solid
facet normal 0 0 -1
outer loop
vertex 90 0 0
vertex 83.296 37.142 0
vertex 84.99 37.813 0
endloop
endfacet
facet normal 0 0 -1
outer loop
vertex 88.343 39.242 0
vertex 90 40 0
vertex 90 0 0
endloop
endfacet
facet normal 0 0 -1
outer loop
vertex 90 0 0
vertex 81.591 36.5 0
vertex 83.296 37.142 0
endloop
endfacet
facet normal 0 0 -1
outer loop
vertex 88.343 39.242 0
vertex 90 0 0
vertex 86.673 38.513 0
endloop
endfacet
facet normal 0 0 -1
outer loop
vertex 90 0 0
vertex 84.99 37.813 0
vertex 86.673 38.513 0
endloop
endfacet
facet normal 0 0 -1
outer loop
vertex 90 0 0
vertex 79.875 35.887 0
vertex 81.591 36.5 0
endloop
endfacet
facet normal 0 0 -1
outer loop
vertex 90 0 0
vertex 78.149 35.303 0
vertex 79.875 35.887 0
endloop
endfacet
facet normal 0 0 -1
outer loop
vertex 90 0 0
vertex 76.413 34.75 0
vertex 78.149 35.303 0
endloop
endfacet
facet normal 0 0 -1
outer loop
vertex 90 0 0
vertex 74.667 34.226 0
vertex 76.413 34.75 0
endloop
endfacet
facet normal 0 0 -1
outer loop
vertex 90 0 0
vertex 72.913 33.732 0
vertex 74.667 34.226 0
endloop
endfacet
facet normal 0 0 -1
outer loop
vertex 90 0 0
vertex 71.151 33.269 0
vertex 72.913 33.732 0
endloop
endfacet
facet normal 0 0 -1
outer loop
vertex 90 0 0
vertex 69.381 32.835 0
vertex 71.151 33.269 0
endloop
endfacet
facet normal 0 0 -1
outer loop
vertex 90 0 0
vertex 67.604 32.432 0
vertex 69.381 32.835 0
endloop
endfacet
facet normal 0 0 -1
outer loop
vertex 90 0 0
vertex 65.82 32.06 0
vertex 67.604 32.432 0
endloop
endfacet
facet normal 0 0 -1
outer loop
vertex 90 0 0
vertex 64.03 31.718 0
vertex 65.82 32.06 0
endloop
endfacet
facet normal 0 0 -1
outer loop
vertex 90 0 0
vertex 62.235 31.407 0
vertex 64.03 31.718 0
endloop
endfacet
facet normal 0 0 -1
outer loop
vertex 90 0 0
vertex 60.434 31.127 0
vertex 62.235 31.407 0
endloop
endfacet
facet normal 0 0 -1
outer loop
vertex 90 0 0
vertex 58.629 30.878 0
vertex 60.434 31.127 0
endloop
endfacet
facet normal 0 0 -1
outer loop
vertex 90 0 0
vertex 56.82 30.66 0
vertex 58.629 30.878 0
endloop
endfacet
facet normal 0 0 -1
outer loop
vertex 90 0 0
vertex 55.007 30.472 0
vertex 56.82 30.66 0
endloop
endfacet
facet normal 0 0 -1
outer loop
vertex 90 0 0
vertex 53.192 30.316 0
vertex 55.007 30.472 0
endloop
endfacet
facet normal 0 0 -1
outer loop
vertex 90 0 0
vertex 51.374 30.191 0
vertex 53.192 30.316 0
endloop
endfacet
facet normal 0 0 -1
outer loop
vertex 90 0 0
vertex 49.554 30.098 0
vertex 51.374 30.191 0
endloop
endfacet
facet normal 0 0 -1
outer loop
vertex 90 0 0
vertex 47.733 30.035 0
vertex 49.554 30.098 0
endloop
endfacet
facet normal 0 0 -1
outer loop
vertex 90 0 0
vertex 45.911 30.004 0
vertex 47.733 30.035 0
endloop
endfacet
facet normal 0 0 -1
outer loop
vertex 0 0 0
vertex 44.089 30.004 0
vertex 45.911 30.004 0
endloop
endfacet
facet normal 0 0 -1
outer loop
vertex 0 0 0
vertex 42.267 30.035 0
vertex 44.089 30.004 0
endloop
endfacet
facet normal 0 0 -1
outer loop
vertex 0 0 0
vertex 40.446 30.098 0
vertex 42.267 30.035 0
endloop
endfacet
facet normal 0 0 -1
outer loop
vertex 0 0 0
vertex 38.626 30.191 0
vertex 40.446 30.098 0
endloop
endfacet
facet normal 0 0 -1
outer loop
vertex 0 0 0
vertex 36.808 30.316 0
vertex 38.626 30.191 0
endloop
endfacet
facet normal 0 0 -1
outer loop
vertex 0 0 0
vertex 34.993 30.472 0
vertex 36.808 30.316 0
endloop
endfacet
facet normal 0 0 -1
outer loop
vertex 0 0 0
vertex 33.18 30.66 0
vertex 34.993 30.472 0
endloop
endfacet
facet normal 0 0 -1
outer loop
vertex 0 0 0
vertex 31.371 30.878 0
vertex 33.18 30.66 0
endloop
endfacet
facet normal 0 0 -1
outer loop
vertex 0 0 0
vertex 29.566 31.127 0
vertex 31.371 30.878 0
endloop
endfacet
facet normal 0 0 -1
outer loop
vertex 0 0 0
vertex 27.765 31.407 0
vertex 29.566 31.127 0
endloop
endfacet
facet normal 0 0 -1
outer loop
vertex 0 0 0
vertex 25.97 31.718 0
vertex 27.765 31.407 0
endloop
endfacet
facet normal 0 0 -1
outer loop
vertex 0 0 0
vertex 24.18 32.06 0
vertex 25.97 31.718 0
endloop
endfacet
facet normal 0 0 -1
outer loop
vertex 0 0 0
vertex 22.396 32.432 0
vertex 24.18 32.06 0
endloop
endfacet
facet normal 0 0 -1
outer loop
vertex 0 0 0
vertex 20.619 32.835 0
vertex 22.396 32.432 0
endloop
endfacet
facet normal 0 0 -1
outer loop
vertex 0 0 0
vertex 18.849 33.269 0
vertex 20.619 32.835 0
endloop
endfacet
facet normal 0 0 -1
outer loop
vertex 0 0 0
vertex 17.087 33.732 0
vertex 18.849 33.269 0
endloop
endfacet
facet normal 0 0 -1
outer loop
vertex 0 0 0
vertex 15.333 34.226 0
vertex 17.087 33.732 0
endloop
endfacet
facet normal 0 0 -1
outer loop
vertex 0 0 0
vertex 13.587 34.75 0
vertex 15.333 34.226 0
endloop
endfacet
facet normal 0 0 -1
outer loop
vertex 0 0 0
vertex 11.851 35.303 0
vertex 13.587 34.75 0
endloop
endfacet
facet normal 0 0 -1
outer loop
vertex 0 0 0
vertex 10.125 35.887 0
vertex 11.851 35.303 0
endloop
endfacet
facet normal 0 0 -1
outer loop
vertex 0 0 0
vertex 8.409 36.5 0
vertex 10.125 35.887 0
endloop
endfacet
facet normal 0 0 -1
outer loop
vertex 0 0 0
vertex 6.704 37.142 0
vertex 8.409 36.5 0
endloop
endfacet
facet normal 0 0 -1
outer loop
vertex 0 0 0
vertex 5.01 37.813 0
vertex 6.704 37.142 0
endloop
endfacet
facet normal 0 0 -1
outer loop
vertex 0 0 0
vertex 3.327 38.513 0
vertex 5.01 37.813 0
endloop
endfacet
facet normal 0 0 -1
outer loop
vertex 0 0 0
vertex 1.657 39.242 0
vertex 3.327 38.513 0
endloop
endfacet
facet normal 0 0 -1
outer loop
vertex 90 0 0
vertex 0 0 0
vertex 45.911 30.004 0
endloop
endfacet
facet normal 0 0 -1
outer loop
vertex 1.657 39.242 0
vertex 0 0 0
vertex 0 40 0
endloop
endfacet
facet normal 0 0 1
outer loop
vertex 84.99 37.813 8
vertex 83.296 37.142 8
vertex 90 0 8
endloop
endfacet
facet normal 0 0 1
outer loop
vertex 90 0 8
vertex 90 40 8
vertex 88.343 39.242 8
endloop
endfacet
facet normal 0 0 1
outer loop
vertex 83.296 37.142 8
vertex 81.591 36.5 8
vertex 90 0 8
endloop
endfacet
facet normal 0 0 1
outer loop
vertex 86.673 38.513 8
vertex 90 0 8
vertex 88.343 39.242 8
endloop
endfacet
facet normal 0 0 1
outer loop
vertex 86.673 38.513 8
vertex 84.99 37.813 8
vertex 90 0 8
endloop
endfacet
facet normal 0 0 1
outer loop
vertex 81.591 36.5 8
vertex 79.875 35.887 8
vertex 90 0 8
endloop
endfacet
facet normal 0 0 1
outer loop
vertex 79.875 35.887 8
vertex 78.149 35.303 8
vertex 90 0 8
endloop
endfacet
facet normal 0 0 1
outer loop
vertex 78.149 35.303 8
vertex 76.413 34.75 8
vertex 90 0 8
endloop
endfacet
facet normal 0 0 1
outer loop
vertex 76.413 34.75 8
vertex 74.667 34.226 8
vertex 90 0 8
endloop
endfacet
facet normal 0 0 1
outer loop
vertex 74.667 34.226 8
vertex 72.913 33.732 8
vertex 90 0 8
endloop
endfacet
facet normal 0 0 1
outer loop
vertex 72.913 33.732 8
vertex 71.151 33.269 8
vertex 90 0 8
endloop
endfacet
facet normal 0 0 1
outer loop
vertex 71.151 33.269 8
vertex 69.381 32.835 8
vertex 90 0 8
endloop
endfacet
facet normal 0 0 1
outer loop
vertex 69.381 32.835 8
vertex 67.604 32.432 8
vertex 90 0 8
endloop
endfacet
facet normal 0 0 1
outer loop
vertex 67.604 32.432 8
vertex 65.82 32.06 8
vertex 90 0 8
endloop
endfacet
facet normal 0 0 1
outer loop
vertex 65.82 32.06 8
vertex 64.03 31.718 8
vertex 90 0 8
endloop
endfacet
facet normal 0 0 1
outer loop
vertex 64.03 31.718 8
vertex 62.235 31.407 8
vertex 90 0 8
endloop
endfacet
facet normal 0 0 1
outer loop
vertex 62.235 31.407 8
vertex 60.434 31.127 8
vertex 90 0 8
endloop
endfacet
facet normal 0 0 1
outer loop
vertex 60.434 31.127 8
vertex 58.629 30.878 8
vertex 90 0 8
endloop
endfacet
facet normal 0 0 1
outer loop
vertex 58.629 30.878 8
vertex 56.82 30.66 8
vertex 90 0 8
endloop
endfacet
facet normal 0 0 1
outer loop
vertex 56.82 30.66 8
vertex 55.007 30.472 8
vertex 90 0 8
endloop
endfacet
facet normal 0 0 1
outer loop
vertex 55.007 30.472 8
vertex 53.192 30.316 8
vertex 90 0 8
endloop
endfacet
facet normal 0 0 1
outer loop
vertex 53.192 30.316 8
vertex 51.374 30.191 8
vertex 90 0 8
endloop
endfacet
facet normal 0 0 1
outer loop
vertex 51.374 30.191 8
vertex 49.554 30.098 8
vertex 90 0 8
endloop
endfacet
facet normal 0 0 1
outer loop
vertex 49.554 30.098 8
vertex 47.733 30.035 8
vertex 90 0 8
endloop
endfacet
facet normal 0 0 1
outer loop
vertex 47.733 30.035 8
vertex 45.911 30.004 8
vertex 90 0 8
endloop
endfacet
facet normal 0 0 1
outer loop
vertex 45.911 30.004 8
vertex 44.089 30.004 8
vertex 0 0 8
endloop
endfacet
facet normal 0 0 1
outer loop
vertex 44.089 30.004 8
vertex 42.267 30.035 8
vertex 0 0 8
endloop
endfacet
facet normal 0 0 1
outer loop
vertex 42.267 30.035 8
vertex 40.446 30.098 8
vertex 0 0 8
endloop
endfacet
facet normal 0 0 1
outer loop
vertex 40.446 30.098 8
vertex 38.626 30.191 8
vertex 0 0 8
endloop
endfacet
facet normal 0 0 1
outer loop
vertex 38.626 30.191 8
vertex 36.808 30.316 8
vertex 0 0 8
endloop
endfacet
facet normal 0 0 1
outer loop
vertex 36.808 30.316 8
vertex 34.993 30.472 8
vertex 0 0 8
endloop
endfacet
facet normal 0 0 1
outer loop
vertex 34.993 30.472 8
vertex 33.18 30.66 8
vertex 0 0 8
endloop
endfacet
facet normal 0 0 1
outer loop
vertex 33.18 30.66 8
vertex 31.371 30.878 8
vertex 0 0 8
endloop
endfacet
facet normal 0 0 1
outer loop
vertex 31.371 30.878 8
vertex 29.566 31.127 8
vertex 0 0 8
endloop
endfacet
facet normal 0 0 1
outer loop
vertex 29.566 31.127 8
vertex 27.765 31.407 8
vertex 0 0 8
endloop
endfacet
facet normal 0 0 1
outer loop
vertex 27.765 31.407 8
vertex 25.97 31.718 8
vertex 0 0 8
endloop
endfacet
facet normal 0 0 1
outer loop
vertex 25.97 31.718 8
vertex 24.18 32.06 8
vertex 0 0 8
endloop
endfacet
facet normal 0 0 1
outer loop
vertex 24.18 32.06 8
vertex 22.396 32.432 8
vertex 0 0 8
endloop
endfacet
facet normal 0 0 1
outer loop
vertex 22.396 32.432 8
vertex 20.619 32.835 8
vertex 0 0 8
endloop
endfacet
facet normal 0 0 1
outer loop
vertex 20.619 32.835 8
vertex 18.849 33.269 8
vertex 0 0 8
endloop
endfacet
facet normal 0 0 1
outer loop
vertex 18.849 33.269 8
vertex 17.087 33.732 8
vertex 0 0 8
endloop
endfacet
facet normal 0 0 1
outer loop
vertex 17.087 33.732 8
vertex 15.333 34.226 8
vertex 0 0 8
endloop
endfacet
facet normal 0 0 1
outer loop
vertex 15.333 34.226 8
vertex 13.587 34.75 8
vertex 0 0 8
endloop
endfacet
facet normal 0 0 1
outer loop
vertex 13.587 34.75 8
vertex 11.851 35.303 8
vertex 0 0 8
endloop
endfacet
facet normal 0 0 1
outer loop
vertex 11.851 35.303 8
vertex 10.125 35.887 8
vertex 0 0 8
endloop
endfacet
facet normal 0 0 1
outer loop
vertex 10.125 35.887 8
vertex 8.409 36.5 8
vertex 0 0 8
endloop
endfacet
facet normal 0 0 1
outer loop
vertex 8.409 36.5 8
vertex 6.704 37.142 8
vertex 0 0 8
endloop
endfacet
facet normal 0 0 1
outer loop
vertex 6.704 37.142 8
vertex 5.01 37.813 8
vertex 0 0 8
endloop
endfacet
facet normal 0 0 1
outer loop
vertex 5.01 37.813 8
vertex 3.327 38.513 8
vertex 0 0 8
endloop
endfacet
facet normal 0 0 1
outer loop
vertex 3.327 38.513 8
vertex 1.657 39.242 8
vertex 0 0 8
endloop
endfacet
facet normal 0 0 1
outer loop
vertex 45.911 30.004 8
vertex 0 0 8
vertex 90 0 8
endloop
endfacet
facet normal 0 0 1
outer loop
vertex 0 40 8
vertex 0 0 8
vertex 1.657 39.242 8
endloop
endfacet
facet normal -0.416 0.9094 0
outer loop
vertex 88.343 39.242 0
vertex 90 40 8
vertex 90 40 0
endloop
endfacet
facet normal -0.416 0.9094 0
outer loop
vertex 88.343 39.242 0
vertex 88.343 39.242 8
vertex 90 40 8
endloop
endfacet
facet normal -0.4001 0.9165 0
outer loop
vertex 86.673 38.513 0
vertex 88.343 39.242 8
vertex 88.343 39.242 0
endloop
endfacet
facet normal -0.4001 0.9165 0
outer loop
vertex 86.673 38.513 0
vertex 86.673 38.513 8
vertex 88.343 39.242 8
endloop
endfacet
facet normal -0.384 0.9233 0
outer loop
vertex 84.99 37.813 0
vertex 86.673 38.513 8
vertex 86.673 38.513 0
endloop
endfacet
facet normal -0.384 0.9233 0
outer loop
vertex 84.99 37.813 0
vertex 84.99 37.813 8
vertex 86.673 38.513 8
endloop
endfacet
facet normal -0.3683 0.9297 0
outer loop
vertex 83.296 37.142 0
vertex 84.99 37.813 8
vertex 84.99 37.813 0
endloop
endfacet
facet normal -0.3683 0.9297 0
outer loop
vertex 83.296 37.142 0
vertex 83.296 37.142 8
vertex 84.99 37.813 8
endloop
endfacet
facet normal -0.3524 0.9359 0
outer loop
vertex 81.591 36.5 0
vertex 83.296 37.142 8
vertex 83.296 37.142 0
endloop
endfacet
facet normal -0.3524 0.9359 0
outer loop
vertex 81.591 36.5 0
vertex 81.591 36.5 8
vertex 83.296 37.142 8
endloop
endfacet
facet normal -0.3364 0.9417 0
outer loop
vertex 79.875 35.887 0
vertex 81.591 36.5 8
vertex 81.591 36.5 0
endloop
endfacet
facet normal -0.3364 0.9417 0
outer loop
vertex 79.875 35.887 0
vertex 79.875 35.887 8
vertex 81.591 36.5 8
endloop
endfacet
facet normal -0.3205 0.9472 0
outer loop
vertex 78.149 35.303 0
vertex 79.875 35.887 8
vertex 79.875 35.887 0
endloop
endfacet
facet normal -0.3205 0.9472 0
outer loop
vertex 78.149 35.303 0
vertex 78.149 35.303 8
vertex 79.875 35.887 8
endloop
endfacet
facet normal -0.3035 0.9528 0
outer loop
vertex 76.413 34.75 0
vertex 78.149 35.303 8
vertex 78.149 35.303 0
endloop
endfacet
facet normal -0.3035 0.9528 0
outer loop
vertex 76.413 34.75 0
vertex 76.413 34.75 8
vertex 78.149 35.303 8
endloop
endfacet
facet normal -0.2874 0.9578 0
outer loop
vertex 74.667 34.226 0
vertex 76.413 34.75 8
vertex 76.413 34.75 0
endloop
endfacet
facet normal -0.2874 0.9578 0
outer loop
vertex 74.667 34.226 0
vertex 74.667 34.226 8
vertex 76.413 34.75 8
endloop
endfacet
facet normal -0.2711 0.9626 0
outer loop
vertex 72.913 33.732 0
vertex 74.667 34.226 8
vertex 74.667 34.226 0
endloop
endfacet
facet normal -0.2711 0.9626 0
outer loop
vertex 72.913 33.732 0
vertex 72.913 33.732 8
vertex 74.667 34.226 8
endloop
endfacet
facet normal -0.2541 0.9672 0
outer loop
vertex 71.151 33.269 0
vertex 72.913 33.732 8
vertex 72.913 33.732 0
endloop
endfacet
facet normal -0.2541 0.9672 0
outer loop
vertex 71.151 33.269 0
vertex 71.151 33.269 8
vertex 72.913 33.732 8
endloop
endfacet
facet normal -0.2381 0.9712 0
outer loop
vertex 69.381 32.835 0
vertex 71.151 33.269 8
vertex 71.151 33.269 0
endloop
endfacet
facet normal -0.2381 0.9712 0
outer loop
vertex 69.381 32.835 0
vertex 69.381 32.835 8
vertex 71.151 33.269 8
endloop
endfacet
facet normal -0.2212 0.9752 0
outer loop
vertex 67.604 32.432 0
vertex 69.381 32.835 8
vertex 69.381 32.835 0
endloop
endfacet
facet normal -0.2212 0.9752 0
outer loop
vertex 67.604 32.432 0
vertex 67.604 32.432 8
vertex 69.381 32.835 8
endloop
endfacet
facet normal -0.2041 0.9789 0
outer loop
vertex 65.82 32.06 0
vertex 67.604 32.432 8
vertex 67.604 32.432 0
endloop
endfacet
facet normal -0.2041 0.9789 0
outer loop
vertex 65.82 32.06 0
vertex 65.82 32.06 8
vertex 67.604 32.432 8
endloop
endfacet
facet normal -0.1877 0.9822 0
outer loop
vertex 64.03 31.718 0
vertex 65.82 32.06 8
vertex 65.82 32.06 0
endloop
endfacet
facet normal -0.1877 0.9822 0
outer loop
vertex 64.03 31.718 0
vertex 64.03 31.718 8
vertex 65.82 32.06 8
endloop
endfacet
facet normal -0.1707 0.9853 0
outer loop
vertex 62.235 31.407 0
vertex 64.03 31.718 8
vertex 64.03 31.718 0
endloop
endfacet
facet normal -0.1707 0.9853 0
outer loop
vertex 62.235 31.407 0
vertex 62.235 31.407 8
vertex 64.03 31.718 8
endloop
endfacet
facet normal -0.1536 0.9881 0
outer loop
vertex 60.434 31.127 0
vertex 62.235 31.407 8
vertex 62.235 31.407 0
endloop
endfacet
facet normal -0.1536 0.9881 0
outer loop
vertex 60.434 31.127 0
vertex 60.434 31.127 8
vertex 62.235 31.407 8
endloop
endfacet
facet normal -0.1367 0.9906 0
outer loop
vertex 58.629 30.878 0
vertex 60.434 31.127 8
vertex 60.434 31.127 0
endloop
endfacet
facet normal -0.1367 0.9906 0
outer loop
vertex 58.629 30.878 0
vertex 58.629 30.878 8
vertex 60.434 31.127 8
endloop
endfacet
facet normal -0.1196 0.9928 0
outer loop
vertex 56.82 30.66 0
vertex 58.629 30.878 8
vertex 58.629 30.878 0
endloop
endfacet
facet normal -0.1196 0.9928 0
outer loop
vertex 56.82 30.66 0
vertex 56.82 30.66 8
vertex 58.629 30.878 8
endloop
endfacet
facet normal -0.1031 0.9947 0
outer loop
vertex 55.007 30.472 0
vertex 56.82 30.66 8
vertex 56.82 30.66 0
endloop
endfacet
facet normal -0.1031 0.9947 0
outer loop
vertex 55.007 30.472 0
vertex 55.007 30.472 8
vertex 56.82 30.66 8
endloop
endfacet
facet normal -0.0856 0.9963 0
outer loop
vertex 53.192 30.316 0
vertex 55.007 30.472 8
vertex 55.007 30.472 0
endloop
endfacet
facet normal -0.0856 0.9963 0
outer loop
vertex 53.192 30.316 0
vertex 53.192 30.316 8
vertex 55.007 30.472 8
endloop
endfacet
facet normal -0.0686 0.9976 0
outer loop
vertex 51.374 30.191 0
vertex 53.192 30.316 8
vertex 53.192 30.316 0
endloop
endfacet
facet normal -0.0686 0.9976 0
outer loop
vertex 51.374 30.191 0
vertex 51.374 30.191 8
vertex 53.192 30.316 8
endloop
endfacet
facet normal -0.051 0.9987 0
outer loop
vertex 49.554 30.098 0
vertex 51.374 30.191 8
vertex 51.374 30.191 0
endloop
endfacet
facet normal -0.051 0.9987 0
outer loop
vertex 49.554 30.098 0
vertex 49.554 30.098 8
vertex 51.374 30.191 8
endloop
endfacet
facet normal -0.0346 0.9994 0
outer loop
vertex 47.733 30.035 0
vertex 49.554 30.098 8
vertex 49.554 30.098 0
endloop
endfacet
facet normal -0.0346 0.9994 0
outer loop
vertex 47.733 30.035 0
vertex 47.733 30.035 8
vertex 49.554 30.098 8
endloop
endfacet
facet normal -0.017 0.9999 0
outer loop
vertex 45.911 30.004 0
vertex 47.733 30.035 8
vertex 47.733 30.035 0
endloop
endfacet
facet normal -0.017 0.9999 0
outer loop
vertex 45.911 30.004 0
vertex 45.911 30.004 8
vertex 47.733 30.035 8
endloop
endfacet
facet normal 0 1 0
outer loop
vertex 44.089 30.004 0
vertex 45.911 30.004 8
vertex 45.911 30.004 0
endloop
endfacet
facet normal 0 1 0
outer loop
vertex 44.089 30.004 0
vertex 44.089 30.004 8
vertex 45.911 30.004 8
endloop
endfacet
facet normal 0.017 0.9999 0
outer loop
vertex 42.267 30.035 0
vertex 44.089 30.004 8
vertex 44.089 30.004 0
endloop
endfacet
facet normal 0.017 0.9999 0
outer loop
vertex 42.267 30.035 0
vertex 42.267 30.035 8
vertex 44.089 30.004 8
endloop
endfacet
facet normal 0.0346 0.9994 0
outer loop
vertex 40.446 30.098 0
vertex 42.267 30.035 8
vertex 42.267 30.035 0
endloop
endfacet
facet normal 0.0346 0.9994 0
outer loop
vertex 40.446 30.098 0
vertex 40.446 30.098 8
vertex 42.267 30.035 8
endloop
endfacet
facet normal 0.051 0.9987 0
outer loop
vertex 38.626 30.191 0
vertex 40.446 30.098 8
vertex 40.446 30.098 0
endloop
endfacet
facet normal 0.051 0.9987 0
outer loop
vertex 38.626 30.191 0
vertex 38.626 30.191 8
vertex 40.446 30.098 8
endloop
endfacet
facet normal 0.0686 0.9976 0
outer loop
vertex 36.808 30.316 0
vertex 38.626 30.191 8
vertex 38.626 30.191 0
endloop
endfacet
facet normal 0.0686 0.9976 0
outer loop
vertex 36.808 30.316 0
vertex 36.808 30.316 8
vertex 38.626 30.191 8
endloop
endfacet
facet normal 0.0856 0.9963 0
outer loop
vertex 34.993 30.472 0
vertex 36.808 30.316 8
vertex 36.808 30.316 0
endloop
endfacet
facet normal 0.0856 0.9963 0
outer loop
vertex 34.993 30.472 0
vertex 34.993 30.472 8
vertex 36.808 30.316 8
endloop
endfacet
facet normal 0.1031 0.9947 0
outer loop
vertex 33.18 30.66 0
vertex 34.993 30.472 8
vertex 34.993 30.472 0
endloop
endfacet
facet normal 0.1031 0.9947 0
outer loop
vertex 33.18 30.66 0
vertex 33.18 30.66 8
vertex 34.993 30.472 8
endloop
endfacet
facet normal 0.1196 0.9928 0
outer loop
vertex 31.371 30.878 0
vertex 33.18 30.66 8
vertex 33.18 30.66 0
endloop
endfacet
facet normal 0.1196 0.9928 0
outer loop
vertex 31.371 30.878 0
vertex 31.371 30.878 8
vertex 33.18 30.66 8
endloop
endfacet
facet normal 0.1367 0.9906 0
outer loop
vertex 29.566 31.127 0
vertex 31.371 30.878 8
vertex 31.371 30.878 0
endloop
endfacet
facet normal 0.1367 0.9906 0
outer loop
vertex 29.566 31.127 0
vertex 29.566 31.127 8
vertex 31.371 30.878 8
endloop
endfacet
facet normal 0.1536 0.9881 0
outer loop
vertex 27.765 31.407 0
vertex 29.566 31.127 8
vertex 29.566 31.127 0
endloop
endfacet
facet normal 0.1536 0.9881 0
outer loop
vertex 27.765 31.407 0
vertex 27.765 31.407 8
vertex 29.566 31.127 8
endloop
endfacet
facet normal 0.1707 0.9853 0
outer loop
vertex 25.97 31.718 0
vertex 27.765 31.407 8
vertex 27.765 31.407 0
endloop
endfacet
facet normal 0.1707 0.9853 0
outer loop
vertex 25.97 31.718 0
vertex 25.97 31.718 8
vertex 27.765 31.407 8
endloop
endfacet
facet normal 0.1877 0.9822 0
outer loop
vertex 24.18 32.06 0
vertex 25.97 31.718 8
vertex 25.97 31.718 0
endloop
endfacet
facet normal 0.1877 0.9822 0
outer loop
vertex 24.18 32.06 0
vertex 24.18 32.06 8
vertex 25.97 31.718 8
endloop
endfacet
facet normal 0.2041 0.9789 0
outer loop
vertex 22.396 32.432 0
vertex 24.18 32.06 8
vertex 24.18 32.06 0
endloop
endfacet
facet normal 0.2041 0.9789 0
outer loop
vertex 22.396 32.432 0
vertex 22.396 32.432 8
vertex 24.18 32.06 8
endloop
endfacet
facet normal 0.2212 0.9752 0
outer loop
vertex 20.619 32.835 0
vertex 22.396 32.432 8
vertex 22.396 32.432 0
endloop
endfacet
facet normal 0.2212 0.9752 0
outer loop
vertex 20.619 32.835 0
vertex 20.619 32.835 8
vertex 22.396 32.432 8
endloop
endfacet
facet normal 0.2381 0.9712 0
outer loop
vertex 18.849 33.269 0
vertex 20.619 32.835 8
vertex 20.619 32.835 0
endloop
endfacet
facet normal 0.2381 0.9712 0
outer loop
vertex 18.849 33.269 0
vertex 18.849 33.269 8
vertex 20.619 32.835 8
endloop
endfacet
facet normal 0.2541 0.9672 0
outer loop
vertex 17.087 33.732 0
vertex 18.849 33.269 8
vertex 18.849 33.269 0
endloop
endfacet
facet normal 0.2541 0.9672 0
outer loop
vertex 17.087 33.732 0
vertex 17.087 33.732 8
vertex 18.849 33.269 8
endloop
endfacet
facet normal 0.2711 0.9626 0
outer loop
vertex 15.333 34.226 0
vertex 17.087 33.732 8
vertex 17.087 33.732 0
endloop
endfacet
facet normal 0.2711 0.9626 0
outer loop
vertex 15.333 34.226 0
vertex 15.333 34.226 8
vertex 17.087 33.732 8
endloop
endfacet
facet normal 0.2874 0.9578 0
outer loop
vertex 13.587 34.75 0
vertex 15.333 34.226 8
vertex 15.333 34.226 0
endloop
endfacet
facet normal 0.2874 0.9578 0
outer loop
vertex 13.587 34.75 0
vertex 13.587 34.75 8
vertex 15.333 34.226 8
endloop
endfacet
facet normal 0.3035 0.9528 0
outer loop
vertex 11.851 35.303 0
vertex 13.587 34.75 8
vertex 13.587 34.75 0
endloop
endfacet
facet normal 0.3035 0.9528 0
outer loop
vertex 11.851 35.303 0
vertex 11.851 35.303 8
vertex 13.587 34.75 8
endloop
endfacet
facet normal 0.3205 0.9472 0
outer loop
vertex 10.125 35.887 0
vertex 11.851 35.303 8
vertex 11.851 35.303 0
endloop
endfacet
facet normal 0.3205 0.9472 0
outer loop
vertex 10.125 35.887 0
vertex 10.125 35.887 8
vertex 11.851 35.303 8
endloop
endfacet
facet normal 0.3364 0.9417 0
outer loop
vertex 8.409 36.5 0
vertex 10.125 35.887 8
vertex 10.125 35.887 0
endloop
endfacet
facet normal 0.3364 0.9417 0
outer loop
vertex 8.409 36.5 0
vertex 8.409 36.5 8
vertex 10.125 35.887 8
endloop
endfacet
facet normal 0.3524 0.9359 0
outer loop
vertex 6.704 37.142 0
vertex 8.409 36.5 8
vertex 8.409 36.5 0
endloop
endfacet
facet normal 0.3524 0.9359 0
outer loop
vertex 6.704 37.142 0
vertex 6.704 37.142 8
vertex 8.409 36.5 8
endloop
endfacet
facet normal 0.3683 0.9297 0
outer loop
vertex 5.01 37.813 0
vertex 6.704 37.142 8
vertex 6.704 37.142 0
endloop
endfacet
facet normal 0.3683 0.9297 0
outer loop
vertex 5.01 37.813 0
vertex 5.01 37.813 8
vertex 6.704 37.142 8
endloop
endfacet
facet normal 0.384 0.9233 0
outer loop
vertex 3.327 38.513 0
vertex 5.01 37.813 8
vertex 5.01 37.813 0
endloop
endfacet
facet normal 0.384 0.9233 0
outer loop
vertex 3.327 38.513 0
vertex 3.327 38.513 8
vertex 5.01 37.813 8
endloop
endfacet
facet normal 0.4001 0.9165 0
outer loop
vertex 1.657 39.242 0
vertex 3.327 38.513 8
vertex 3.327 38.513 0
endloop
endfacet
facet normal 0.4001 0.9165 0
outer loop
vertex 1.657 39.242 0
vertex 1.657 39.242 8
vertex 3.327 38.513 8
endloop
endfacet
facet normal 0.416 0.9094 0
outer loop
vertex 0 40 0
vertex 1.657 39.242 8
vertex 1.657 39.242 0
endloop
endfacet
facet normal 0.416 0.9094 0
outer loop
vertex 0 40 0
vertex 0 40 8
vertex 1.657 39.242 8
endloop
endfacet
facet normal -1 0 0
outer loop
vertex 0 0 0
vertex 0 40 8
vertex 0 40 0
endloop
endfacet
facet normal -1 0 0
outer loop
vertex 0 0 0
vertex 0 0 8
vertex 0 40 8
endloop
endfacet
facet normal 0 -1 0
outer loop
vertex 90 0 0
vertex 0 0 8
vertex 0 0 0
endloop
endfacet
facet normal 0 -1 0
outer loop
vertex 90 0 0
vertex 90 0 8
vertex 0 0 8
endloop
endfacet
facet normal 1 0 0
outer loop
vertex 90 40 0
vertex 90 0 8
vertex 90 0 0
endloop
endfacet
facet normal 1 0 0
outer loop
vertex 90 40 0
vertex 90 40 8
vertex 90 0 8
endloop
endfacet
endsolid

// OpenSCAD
$fn = 32;

// ----------------------------------------------------------------------
// Arc profile plate: notch, 54 points
// ----------------------------------------------------------------------

// --- parameters (mm) ---
bar_l = 90;               // bar length, X
bar_w = 40;               // bar width, Y
notch_depth = 10;         // depth of the arc notch at mid-span
arc_r = 106.25;           // radius of the notch arc
arc_angle = 50.12;        // notch arc angle, degrees
arc_step = 1;             // sampling step of the notch arc, degrees
plate_t = 8;              // plate thickness, Z

profile = [[0, 0], [90, 0], [90, 40], [88.343, 39.242], [86.673, 38.513], [84.99, 37.813], [83.296, 37.142], [81.591, 36.5], [79.875, 35.887], [78.149, 35.303], [76.413, 34.75], [74.667, 34.226], [72.913, 33.732], [71.151, 33.269], [69.381, 32.835], [67.604, 32.432], [65.82, 32.06], [64.03, 31.718], [62.235, 31.407], [60.434, 31.127], [58.629, 30.878], [56.82, 30.66], [55.007, 30.472], [53.192, 30.316], [51.374, 30.191], [49.554, 30.098], [47.733, 30.035], [45.911, 30.004], [44.089, 30.004], [42.267, 30.035], [40.446, 30.098], [38.626, 30.191], [36.808, 30.316], [34.993, 30.472], [33.18, 30.66], [31.371, 30.878], [29.566, 31.127], [27.765, 31.407], [25.97, 31.718], [24.18, 32.06], [22.396, 32.432], [20.619, 32.835], [18.849, 33.269], [17.087, 33.732], [15.333, 34.226], [13.587, 34.75], [11.851, 35.303], [10.125, 35.887], [8.409, 36.5], [6.704, 37.142], [5.01, 37.813], [3.327, 38.513], [1.657, 39.242], [0, 40]];  // primary outline, 54 points, counter clockwise

// --- the one profile operation ---
linear_extrude(height = plate_t) polygon(points = profile);
